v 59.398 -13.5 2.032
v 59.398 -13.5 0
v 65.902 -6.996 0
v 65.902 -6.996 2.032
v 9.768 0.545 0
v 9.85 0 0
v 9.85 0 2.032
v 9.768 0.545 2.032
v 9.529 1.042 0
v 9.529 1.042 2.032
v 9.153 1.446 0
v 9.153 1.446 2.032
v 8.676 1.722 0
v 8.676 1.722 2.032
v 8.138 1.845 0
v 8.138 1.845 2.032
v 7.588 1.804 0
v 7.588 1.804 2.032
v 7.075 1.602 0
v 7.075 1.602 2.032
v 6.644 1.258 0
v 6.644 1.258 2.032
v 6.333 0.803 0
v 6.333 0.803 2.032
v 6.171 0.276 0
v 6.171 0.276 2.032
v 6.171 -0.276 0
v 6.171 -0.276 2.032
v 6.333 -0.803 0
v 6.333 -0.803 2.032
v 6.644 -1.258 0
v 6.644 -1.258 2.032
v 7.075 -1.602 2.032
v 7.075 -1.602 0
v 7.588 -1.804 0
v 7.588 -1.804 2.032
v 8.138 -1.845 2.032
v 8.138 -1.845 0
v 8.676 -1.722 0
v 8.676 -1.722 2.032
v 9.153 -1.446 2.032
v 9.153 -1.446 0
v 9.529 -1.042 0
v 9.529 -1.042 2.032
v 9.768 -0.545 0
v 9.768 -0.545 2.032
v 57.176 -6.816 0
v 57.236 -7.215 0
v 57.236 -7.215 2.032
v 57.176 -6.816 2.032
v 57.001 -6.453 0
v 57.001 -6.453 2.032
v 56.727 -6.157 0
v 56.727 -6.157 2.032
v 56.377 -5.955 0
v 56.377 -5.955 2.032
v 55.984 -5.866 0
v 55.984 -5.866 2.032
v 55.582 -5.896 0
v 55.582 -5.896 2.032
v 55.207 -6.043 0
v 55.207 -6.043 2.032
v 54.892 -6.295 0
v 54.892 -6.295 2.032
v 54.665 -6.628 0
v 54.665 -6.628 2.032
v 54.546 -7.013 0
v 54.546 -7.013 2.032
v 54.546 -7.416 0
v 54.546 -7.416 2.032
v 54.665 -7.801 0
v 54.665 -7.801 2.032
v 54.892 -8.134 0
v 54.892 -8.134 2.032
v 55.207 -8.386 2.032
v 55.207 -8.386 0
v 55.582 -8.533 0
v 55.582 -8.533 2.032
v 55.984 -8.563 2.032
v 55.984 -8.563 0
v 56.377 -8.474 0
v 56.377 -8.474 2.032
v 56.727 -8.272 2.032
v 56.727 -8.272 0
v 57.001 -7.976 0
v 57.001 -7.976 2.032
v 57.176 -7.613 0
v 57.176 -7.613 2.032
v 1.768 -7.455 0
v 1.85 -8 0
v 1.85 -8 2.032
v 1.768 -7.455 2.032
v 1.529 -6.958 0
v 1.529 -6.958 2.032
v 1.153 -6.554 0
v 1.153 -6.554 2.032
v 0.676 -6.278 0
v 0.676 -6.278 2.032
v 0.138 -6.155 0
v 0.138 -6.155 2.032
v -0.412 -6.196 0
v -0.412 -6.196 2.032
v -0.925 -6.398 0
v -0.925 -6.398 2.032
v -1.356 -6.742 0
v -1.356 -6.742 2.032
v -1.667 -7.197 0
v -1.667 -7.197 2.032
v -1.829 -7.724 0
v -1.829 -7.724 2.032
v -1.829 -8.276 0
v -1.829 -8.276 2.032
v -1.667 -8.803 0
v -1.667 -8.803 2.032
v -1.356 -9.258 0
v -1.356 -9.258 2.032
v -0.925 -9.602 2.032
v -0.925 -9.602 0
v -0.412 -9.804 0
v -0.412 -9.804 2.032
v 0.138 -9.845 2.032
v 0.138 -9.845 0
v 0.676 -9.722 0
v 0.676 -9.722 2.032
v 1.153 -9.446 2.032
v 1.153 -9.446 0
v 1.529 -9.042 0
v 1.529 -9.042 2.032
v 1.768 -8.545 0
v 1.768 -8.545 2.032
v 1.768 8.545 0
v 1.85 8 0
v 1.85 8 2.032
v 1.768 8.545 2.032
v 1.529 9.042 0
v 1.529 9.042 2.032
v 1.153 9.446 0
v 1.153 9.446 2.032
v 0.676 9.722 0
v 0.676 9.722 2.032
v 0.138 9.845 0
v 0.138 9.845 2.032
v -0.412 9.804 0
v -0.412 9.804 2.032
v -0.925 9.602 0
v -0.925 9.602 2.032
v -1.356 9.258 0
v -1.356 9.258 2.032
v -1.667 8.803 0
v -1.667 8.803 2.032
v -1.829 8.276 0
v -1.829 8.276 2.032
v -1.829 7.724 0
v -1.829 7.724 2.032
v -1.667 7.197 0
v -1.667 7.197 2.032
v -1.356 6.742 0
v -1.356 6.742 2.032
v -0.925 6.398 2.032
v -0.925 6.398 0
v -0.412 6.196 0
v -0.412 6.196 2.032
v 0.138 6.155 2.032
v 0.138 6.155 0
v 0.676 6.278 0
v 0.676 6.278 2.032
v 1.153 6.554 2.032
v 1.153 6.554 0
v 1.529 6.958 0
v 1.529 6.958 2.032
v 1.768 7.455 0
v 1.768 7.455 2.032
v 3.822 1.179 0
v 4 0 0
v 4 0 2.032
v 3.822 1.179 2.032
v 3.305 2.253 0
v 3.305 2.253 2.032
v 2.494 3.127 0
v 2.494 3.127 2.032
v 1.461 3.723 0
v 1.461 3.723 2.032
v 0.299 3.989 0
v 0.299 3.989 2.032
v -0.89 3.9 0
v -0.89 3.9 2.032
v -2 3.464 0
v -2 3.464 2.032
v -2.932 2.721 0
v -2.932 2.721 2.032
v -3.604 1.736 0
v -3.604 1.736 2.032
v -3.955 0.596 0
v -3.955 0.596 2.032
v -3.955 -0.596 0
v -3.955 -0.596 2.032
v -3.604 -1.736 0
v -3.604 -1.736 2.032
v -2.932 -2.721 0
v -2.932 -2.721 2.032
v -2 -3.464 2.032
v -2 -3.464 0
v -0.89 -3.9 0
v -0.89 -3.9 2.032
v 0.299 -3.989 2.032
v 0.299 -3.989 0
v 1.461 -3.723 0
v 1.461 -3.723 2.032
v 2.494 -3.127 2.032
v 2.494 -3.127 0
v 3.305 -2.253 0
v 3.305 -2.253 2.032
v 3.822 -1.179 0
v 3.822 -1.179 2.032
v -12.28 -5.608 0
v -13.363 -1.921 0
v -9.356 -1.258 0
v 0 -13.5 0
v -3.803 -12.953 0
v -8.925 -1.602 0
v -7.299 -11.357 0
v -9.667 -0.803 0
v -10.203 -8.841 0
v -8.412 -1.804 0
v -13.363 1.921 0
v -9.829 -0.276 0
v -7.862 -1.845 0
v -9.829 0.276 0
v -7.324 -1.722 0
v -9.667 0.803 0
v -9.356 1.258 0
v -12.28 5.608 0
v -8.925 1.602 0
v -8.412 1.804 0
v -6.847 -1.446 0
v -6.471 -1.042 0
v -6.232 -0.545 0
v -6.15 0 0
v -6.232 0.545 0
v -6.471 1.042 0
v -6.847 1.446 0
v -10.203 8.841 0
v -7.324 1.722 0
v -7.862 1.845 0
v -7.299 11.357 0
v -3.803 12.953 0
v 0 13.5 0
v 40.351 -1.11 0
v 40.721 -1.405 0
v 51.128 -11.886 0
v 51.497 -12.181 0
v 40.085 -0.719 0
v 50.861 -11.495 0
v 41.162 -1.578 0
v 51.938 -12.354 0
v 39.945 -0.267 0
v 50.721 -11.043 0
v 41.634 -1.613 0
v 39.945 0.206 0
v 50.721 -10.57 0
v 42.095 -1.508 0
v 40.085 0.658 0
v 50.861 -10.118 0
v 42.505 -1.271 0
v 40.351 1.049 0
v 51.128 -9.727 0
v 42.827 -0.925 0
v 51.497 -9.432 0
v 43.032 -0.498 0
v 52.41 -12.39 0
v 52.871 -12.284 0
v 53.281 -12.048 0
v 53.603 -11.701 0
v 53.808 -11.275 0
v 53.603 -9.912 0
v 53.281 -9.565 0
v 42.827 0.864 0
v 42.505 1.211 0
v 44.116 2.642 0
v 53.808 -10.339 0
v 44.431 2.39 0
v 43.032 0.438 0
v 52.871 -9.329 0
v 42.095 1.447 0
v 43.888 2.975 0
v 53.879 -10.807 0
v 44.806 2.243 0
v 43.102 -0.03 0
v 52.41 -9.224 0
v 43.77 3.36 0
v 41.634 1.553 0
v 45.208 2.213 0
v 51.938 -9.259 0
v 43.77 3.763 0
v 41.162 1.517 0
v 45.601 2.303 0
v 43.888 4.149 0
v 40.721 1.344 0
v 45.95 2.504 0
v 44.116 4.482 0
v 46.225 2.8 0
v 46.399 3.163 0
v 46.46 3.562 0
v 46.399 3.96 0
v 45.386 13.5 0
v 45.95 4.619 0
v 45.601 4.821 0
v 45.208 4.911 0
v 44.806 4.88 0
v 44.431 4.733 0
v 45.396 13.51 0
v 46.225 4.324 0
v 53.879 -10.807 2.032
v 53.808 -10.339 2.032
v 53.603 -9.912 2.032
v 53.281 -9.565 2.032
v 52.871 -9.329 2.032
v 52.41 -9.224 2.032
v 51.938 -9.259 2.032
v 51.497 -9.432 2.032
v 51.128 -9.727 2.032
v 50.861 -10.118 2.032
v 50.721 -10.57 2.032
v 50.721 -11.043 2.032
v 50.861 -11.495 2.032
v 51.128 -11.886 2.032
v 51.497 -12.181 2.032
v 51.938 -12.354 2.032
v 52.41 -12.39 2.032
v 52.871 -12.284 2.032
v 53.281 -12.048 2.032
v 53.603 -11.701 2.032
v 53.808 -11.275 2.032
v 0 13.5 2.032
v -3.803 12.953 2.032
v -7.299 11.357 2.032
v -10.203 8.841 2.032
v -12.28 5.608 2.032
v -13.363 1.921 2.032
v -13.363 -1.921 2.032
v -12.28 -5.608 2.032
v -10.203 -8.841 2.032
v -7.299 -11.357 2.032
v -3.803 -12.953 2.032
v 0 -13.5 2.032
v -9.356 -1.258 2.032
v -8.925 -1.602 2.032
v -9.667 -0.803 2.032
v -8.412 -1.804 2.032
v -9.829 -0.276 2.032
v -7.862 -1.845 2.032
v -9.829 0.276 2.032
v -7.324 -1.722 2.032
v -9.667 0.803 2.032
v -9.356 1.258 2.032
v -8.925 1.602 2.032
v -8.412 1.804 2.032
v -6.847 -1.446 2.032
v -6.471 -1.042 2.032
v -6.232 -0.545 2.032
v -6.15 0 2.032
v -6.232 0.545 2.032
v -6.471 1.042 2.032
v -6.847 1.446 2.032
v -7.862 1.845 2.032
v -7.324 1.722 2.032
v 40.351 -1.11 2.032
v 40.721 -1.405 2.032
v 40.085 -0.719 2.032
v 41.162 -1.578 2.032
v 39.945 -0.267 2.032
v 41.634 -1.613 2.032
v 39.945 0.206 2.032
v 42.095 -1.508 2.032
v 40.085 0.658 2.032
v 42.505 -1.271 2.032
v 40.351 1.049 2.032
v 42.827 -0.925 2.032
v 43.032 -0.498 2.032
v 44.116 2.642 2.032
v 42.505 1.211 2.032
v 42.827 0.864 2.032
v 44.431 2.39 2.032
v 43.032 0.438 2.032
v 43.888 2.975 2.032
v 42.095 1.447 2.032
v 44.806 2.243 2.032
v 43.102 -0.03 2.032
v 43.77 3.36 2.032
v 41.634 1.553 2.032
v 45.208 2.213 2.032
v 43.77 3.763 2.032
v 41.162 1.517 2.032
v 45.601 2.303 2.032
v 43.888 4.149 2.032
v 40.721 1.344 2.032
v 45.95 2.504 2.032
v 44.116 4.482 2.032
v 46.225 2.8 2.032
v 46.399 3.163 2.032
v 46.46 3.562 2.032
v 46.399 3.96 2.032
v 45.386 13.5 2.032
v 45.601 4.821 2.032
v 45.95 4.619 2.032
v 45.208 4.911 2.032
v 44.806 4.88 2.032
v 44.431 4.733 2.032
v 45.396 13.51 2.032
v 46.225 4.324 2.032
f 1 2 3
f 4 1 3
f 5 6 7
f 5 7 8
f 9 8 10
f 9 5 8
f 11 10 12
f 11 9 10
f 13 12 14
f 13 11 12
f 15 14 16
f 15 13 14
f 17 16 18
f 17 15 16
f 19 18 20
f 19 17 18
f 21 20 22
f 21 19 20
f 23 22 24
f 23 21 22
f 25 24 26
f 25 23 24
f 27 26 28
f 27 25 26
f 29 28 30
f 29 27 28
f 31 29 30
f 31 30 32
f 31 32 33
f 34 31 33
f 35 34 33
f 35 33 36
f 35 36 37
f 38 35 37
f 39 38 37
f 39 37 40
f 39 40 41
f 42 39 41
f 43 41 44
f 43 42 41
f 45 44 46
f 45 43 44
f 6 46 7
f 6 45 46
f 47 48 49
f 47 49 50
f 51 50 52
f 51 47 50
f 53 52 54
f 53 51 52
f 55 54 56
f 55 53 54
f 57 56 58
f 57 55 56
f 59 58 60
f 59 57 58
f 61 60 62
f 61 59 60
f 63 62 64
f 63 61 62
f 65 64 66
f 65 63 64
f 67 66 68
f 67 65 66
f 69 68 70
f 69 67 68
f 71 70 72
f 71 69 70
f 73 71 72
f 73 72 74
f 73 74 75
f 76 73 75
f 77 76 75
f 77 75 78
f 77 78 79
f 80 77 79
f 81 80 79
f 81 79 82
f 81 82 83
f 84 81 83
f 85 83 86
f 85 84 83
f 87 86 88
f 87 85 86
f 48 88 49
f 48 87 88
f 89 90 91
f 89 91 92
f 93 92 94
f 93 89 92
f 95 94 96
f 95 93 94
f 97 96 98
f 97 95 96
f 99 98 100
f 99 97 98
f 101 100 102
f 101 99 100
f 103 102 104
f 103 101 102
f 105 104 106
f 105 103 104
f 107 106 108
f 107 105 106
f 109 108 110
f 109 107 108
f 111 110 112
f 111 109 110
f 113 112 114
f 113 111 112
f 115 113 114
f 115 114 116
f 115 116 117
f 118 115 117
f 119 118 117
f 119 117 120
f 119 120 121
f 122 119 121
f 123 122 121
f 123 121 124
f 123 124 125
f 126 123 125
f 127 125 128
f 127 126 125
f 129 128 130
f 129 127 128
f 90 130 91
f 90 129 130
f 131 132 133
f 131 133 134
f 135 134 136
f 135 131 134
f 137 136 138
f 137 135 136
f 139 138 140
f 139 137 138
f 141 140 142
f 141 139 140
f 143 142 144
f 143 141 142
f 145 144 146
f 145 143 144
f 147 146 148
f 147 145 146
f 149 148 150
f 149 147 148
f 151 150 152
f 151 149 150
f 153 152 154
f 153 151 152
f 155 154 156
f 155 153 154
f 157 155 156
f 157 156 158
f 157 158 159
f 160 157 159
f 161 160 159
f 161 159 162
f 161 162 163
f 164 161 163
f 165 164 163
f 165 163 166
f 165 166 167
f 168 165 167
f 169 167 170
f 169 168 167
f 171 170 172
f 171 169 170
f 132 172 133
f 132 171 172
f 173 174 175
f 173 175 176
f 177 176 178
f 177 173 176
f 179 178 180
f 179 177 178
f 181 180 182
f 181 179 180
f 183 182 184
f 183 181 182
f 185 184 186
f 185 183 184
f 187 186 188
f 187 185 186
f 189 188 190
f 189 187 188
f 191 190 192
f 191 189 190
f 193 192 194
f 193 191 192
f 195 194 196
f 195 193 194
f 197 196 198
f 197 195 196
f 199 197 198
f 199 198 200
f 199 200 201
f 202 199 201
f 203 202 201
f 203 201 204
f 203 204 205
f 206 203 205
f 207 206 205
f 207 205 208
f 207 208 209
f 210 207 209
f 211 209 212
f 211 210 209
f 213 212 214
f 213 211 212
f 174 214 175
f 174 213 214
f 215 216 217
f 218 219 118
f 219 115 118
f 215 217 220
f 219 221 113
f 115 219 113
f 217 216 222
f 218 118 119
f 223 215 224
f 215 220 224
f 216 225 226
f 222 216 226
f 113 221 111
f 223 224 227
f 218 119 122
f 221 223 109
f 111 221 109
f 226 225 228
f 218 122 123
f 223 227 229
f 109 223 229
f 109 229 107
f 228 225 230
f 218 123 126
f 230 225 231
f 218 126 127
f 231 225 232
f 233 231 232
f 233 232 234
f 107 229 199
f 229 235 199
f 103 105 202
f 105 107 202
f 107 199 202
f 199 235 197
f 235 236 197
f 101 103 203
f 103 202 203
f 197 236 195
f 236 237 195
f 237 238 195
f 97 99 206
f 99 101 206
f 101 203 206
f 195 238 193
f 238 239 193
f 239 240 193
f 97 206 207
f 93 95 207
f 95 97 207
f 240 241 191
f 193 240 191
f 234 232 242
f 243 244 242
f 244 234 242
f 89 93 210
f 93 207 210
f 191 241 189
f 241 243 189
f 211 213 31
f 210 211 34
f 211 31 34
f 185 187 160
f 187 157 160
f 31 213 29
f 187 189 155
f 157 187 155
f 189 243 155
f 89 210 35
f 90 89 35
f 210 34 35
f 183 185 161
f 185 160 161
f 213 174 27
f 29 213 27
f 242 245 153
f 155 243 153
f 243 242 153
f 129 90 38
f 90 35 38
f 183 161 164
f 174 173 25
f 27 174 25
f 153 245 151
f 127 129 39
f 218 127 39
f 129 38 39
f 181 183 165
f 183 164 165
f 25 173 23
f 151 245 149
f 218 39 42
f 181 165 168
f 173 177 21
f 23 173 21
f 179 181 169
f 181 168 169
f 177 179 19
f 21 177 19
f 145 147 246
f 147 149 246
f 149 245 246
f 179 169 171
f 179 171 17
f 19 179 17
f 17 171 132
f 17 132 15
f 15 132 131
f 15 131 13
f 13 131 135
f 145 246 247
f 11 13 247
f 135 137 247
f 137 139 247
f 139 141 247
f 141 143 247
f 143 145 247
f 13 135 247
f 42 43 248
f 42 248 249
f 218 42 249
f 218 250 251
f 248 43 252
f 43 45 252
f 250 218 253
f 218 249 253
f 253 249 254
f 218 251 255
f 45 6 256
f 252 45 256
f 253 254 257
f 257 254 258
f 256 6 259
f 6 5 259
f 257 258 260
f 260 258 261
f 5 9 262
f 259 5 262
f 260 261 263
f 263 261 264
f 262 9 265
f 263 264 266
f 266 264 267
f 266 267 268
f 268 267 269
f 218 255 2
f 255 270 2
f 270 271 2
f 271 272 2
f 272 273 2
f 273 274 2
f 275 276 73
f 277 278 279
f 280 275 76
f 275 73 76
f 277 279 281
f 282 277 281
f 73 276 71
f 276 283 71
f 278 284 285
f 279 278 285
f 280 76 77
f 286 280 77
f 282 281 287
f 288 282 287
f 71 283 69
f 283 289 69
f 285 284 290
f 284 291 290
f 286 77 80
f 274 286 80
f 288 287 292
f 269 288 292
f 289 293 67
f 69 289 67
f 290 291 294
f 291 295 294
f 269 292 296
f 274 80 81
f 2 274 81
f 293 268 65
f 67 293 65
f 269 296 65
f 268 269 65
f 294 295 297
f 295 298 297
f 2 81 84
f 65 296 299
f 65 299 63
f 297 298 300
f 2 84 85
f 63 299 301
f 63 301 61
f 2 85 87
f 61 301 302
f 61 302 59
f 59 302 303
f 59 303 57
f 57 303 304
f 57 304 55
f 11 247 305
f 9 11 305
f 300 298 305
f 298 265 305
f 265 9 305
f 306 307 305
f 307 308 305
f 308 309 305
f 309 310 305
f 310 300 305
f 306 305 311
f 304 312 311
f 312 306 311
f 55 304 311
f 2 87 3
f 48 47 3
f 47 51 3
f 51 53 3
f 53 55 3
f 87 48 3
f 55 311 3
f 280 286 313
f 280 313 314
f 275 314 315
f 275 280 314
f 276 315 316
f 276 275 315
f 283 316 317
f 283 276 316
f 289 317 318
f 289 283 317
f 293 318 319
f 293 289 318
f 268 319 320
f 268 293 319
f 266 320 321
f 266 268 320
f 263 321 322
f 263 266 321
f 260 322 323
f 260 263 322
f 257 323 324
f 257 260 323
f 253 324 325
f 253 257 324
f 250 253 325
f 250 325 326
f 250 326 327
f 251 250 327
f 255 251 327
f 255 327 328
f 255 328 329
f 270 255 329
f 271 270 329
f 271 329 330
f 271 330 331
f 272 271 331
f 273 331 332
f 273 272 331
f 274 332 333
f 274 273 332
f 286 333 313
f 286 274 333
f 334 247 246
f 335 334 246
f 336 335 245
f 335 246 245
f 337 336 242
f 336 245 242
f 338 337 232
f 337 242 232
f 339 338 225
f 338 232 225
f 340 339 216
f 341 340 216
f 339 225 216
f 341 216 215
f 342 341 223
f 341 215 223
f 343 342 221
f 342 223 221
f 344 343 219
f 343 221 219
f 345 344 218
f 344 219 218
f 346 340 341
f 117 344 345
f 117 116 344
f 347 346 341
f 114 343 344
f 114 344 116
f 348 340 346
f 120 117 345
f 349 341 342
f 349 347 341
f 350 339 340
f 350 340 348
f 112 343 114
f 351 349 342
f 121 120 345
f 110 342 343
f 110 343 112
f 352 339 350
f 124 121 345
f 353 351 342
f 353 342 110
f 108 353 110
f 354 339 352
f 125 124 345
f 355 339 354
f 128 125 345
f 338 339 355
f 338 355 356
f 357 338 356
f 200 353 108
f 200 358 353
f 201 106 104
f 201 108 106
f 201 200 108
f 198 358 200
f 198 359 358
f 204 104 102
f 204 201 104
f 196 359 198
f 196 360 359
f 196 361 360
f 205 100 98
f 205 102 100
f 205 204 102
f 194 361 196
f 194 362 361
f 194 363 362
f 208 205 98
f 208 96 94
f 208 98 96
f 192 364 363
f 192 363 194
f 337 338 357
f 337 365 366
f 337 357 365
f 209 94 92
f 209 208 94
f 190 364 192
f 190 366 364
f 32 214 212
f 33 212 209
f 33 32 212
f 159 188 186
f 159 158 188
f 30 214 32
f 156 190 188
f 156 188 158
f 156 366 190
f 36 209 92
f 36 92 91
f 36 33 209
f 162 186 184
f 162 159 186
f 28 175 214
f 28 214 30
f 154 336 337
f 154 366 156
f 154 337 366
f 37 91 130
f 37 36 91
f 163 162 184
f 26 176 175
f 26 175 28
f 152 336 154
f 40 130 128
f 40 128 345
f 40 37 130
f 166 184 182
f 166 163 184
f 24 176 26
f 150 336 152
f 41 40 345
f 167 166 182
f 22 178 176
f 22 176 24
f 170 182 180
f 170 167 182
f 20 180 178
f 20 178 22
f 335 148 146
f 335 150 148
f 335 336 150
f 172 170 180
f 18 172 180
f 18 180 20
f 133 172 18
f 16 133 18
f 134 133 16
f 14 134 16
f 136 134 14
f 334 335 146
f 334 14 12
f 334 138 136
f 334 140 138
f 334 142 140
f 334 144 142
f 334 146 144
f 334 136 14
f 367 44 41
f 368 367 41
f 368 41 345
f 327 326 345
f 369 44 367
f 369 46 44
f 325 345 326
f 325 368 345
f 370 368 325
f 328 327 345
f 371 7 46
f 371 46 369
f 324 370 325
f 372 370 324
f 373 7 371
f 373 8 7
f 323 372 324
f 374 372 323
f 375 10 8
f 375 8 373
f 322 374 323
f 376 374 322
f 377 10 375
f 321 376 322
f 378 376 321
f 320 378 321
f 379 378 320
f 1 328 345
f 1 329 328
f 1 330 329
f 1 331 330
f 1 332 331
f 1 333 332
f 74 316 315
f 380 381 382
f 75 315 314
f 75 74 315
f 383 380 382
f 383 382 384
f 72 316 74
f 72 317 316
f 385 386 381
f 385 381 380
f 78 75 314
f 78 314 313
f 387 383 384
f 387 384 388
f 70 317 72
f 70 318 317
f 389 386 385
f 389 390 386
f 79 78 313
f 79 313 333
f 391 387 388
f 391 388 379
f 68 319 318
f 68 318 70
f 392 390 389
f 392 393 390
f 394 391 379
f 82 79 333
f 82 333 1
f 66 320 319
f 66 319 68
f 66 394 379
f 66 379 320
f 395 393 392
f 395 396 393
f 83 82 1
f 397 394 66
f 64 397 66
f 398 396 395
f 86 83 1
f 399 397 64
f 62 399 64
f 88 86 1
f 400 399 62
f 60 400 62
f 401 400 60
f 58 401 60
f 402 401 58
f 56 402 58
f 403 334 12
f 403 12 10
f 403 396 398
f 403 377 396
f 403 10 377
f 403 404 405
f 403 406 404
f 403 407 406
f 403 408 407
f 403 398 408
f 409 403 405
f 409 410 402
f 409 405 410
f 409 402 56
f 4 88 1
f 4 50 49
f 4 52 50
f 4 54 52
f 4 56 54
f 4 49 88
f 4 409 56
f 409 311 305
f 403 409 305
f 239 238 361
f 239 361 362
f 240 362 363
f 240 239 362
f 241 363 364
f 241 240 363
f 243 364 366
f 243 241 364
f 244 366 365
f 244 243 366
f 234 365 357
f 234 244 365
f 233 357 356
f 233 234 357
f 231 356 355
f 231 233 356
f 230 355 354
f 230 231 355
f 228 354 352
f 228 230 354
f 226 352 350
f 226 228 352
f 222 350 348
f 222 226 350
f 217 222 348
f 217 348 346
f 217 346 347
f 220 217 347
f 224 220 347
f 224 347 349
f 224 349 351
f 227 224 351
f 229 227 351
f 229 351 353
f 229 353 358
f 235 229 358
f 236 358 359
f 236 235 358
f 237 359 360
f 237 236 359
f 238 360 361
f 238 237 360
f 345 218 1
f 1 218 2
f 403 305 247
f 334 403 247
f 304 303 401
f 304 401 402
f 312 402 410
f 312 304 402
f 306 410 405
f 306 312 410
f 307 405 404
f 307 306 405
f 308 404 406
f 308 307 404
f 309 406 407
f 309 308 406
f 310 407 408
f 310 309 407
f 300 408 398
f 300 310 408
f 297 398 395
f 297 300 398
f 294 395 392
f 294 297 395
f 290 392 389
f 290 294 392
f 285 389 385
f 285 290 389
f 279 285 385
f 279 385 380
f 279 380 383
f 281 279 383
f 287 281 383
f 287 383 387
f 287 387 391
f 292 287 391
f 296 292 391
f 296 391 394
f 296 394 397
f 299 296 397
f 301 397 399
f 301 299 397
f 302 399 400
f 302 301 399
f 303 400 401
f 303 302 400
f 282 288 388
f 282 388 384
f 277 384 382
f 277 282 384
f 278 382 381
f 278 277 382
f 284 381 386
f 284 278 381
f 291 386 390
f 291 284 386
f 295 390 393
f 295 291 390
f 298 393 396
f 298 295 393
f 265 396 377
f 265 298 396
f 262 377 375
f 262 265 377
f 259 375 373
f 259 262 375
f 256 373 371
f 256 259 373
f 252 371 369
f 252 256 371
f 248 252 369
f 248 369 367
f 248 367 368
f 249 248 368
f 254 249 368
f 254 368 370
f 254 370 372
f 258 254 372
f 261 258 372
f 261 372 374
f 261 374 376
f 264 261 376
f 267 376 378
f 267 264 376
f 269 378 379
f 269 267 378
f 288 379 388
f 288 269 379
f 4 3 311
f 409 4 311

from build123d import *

# Parameters (mm, degrees)
SKETCH2_R           = 1.85
SKETCH2_R_2         = 1.35255
SKETCH2_R_3         = 4
SKETCH2_R_4         = 1.5875
BOSS_EXTRUDE1_DEPTH = 2.032


with BuildPart() as part:
    # Sketch2 → Boss-Extrude1 (new body)
    with BuildSketch(Plane.XY):
        with BuildLine():
            Line((45.396235039, 13.510064828), (45.386170211, 13.5))
            Line((45.386170211, 13.5), (0, 13.5))
            ThreePointArc((0, 13.5), (-13.5, 0), (0, -13.5))
            Line((0, -13.5), (59.39836352, -13.5))
            Line((59.39836352, -13.5), (65.902331694, -6.996031827))
            Line((65.902331694, -6.996031827), (45.396235039, 13.510064828))
        make_face()
        with Locations((8, 0)):
            Circle(SKETCH2_R, mode=Mode.SUBTRACT)
        with Locations((55.883335711, -7.214527822)):
            Circle(SKETCH2_R_2, mode=Mode.SUBTRACT)
        with Locations((45.107028366, 3.561779523)):
            Circle(SKETCH2_R_2, mode=Mode.SUBTRACT)
        Circle(SKETCH2_R_3, mode=Mode.SUBTRACT)
        with Locations((0, -8)):
            Circle(SKETCH2_R, mode=Mode.SUBTRACT)
        with Locations((-8, 0)):
            Circle(SKETCH2_R, mode=Mode.SUBTRACT)
        with Locations((0, 8)):
            Circle(SKETCH2_R, mode=Mode.SUBTRACT)
        with Locations((41.514925917, -0.030322925)):
            Circle(SKETCH2_R_4, mode=Mode.SUBTRACT)
        with Locations((52.291233263, -10.80663027)):
            Circle(SKETCH2_R_4, mode=Mode.SUBTRACT)
    extrude(amount=BOSS_EXTRUDE1_DEPTH)


solid = part.part
